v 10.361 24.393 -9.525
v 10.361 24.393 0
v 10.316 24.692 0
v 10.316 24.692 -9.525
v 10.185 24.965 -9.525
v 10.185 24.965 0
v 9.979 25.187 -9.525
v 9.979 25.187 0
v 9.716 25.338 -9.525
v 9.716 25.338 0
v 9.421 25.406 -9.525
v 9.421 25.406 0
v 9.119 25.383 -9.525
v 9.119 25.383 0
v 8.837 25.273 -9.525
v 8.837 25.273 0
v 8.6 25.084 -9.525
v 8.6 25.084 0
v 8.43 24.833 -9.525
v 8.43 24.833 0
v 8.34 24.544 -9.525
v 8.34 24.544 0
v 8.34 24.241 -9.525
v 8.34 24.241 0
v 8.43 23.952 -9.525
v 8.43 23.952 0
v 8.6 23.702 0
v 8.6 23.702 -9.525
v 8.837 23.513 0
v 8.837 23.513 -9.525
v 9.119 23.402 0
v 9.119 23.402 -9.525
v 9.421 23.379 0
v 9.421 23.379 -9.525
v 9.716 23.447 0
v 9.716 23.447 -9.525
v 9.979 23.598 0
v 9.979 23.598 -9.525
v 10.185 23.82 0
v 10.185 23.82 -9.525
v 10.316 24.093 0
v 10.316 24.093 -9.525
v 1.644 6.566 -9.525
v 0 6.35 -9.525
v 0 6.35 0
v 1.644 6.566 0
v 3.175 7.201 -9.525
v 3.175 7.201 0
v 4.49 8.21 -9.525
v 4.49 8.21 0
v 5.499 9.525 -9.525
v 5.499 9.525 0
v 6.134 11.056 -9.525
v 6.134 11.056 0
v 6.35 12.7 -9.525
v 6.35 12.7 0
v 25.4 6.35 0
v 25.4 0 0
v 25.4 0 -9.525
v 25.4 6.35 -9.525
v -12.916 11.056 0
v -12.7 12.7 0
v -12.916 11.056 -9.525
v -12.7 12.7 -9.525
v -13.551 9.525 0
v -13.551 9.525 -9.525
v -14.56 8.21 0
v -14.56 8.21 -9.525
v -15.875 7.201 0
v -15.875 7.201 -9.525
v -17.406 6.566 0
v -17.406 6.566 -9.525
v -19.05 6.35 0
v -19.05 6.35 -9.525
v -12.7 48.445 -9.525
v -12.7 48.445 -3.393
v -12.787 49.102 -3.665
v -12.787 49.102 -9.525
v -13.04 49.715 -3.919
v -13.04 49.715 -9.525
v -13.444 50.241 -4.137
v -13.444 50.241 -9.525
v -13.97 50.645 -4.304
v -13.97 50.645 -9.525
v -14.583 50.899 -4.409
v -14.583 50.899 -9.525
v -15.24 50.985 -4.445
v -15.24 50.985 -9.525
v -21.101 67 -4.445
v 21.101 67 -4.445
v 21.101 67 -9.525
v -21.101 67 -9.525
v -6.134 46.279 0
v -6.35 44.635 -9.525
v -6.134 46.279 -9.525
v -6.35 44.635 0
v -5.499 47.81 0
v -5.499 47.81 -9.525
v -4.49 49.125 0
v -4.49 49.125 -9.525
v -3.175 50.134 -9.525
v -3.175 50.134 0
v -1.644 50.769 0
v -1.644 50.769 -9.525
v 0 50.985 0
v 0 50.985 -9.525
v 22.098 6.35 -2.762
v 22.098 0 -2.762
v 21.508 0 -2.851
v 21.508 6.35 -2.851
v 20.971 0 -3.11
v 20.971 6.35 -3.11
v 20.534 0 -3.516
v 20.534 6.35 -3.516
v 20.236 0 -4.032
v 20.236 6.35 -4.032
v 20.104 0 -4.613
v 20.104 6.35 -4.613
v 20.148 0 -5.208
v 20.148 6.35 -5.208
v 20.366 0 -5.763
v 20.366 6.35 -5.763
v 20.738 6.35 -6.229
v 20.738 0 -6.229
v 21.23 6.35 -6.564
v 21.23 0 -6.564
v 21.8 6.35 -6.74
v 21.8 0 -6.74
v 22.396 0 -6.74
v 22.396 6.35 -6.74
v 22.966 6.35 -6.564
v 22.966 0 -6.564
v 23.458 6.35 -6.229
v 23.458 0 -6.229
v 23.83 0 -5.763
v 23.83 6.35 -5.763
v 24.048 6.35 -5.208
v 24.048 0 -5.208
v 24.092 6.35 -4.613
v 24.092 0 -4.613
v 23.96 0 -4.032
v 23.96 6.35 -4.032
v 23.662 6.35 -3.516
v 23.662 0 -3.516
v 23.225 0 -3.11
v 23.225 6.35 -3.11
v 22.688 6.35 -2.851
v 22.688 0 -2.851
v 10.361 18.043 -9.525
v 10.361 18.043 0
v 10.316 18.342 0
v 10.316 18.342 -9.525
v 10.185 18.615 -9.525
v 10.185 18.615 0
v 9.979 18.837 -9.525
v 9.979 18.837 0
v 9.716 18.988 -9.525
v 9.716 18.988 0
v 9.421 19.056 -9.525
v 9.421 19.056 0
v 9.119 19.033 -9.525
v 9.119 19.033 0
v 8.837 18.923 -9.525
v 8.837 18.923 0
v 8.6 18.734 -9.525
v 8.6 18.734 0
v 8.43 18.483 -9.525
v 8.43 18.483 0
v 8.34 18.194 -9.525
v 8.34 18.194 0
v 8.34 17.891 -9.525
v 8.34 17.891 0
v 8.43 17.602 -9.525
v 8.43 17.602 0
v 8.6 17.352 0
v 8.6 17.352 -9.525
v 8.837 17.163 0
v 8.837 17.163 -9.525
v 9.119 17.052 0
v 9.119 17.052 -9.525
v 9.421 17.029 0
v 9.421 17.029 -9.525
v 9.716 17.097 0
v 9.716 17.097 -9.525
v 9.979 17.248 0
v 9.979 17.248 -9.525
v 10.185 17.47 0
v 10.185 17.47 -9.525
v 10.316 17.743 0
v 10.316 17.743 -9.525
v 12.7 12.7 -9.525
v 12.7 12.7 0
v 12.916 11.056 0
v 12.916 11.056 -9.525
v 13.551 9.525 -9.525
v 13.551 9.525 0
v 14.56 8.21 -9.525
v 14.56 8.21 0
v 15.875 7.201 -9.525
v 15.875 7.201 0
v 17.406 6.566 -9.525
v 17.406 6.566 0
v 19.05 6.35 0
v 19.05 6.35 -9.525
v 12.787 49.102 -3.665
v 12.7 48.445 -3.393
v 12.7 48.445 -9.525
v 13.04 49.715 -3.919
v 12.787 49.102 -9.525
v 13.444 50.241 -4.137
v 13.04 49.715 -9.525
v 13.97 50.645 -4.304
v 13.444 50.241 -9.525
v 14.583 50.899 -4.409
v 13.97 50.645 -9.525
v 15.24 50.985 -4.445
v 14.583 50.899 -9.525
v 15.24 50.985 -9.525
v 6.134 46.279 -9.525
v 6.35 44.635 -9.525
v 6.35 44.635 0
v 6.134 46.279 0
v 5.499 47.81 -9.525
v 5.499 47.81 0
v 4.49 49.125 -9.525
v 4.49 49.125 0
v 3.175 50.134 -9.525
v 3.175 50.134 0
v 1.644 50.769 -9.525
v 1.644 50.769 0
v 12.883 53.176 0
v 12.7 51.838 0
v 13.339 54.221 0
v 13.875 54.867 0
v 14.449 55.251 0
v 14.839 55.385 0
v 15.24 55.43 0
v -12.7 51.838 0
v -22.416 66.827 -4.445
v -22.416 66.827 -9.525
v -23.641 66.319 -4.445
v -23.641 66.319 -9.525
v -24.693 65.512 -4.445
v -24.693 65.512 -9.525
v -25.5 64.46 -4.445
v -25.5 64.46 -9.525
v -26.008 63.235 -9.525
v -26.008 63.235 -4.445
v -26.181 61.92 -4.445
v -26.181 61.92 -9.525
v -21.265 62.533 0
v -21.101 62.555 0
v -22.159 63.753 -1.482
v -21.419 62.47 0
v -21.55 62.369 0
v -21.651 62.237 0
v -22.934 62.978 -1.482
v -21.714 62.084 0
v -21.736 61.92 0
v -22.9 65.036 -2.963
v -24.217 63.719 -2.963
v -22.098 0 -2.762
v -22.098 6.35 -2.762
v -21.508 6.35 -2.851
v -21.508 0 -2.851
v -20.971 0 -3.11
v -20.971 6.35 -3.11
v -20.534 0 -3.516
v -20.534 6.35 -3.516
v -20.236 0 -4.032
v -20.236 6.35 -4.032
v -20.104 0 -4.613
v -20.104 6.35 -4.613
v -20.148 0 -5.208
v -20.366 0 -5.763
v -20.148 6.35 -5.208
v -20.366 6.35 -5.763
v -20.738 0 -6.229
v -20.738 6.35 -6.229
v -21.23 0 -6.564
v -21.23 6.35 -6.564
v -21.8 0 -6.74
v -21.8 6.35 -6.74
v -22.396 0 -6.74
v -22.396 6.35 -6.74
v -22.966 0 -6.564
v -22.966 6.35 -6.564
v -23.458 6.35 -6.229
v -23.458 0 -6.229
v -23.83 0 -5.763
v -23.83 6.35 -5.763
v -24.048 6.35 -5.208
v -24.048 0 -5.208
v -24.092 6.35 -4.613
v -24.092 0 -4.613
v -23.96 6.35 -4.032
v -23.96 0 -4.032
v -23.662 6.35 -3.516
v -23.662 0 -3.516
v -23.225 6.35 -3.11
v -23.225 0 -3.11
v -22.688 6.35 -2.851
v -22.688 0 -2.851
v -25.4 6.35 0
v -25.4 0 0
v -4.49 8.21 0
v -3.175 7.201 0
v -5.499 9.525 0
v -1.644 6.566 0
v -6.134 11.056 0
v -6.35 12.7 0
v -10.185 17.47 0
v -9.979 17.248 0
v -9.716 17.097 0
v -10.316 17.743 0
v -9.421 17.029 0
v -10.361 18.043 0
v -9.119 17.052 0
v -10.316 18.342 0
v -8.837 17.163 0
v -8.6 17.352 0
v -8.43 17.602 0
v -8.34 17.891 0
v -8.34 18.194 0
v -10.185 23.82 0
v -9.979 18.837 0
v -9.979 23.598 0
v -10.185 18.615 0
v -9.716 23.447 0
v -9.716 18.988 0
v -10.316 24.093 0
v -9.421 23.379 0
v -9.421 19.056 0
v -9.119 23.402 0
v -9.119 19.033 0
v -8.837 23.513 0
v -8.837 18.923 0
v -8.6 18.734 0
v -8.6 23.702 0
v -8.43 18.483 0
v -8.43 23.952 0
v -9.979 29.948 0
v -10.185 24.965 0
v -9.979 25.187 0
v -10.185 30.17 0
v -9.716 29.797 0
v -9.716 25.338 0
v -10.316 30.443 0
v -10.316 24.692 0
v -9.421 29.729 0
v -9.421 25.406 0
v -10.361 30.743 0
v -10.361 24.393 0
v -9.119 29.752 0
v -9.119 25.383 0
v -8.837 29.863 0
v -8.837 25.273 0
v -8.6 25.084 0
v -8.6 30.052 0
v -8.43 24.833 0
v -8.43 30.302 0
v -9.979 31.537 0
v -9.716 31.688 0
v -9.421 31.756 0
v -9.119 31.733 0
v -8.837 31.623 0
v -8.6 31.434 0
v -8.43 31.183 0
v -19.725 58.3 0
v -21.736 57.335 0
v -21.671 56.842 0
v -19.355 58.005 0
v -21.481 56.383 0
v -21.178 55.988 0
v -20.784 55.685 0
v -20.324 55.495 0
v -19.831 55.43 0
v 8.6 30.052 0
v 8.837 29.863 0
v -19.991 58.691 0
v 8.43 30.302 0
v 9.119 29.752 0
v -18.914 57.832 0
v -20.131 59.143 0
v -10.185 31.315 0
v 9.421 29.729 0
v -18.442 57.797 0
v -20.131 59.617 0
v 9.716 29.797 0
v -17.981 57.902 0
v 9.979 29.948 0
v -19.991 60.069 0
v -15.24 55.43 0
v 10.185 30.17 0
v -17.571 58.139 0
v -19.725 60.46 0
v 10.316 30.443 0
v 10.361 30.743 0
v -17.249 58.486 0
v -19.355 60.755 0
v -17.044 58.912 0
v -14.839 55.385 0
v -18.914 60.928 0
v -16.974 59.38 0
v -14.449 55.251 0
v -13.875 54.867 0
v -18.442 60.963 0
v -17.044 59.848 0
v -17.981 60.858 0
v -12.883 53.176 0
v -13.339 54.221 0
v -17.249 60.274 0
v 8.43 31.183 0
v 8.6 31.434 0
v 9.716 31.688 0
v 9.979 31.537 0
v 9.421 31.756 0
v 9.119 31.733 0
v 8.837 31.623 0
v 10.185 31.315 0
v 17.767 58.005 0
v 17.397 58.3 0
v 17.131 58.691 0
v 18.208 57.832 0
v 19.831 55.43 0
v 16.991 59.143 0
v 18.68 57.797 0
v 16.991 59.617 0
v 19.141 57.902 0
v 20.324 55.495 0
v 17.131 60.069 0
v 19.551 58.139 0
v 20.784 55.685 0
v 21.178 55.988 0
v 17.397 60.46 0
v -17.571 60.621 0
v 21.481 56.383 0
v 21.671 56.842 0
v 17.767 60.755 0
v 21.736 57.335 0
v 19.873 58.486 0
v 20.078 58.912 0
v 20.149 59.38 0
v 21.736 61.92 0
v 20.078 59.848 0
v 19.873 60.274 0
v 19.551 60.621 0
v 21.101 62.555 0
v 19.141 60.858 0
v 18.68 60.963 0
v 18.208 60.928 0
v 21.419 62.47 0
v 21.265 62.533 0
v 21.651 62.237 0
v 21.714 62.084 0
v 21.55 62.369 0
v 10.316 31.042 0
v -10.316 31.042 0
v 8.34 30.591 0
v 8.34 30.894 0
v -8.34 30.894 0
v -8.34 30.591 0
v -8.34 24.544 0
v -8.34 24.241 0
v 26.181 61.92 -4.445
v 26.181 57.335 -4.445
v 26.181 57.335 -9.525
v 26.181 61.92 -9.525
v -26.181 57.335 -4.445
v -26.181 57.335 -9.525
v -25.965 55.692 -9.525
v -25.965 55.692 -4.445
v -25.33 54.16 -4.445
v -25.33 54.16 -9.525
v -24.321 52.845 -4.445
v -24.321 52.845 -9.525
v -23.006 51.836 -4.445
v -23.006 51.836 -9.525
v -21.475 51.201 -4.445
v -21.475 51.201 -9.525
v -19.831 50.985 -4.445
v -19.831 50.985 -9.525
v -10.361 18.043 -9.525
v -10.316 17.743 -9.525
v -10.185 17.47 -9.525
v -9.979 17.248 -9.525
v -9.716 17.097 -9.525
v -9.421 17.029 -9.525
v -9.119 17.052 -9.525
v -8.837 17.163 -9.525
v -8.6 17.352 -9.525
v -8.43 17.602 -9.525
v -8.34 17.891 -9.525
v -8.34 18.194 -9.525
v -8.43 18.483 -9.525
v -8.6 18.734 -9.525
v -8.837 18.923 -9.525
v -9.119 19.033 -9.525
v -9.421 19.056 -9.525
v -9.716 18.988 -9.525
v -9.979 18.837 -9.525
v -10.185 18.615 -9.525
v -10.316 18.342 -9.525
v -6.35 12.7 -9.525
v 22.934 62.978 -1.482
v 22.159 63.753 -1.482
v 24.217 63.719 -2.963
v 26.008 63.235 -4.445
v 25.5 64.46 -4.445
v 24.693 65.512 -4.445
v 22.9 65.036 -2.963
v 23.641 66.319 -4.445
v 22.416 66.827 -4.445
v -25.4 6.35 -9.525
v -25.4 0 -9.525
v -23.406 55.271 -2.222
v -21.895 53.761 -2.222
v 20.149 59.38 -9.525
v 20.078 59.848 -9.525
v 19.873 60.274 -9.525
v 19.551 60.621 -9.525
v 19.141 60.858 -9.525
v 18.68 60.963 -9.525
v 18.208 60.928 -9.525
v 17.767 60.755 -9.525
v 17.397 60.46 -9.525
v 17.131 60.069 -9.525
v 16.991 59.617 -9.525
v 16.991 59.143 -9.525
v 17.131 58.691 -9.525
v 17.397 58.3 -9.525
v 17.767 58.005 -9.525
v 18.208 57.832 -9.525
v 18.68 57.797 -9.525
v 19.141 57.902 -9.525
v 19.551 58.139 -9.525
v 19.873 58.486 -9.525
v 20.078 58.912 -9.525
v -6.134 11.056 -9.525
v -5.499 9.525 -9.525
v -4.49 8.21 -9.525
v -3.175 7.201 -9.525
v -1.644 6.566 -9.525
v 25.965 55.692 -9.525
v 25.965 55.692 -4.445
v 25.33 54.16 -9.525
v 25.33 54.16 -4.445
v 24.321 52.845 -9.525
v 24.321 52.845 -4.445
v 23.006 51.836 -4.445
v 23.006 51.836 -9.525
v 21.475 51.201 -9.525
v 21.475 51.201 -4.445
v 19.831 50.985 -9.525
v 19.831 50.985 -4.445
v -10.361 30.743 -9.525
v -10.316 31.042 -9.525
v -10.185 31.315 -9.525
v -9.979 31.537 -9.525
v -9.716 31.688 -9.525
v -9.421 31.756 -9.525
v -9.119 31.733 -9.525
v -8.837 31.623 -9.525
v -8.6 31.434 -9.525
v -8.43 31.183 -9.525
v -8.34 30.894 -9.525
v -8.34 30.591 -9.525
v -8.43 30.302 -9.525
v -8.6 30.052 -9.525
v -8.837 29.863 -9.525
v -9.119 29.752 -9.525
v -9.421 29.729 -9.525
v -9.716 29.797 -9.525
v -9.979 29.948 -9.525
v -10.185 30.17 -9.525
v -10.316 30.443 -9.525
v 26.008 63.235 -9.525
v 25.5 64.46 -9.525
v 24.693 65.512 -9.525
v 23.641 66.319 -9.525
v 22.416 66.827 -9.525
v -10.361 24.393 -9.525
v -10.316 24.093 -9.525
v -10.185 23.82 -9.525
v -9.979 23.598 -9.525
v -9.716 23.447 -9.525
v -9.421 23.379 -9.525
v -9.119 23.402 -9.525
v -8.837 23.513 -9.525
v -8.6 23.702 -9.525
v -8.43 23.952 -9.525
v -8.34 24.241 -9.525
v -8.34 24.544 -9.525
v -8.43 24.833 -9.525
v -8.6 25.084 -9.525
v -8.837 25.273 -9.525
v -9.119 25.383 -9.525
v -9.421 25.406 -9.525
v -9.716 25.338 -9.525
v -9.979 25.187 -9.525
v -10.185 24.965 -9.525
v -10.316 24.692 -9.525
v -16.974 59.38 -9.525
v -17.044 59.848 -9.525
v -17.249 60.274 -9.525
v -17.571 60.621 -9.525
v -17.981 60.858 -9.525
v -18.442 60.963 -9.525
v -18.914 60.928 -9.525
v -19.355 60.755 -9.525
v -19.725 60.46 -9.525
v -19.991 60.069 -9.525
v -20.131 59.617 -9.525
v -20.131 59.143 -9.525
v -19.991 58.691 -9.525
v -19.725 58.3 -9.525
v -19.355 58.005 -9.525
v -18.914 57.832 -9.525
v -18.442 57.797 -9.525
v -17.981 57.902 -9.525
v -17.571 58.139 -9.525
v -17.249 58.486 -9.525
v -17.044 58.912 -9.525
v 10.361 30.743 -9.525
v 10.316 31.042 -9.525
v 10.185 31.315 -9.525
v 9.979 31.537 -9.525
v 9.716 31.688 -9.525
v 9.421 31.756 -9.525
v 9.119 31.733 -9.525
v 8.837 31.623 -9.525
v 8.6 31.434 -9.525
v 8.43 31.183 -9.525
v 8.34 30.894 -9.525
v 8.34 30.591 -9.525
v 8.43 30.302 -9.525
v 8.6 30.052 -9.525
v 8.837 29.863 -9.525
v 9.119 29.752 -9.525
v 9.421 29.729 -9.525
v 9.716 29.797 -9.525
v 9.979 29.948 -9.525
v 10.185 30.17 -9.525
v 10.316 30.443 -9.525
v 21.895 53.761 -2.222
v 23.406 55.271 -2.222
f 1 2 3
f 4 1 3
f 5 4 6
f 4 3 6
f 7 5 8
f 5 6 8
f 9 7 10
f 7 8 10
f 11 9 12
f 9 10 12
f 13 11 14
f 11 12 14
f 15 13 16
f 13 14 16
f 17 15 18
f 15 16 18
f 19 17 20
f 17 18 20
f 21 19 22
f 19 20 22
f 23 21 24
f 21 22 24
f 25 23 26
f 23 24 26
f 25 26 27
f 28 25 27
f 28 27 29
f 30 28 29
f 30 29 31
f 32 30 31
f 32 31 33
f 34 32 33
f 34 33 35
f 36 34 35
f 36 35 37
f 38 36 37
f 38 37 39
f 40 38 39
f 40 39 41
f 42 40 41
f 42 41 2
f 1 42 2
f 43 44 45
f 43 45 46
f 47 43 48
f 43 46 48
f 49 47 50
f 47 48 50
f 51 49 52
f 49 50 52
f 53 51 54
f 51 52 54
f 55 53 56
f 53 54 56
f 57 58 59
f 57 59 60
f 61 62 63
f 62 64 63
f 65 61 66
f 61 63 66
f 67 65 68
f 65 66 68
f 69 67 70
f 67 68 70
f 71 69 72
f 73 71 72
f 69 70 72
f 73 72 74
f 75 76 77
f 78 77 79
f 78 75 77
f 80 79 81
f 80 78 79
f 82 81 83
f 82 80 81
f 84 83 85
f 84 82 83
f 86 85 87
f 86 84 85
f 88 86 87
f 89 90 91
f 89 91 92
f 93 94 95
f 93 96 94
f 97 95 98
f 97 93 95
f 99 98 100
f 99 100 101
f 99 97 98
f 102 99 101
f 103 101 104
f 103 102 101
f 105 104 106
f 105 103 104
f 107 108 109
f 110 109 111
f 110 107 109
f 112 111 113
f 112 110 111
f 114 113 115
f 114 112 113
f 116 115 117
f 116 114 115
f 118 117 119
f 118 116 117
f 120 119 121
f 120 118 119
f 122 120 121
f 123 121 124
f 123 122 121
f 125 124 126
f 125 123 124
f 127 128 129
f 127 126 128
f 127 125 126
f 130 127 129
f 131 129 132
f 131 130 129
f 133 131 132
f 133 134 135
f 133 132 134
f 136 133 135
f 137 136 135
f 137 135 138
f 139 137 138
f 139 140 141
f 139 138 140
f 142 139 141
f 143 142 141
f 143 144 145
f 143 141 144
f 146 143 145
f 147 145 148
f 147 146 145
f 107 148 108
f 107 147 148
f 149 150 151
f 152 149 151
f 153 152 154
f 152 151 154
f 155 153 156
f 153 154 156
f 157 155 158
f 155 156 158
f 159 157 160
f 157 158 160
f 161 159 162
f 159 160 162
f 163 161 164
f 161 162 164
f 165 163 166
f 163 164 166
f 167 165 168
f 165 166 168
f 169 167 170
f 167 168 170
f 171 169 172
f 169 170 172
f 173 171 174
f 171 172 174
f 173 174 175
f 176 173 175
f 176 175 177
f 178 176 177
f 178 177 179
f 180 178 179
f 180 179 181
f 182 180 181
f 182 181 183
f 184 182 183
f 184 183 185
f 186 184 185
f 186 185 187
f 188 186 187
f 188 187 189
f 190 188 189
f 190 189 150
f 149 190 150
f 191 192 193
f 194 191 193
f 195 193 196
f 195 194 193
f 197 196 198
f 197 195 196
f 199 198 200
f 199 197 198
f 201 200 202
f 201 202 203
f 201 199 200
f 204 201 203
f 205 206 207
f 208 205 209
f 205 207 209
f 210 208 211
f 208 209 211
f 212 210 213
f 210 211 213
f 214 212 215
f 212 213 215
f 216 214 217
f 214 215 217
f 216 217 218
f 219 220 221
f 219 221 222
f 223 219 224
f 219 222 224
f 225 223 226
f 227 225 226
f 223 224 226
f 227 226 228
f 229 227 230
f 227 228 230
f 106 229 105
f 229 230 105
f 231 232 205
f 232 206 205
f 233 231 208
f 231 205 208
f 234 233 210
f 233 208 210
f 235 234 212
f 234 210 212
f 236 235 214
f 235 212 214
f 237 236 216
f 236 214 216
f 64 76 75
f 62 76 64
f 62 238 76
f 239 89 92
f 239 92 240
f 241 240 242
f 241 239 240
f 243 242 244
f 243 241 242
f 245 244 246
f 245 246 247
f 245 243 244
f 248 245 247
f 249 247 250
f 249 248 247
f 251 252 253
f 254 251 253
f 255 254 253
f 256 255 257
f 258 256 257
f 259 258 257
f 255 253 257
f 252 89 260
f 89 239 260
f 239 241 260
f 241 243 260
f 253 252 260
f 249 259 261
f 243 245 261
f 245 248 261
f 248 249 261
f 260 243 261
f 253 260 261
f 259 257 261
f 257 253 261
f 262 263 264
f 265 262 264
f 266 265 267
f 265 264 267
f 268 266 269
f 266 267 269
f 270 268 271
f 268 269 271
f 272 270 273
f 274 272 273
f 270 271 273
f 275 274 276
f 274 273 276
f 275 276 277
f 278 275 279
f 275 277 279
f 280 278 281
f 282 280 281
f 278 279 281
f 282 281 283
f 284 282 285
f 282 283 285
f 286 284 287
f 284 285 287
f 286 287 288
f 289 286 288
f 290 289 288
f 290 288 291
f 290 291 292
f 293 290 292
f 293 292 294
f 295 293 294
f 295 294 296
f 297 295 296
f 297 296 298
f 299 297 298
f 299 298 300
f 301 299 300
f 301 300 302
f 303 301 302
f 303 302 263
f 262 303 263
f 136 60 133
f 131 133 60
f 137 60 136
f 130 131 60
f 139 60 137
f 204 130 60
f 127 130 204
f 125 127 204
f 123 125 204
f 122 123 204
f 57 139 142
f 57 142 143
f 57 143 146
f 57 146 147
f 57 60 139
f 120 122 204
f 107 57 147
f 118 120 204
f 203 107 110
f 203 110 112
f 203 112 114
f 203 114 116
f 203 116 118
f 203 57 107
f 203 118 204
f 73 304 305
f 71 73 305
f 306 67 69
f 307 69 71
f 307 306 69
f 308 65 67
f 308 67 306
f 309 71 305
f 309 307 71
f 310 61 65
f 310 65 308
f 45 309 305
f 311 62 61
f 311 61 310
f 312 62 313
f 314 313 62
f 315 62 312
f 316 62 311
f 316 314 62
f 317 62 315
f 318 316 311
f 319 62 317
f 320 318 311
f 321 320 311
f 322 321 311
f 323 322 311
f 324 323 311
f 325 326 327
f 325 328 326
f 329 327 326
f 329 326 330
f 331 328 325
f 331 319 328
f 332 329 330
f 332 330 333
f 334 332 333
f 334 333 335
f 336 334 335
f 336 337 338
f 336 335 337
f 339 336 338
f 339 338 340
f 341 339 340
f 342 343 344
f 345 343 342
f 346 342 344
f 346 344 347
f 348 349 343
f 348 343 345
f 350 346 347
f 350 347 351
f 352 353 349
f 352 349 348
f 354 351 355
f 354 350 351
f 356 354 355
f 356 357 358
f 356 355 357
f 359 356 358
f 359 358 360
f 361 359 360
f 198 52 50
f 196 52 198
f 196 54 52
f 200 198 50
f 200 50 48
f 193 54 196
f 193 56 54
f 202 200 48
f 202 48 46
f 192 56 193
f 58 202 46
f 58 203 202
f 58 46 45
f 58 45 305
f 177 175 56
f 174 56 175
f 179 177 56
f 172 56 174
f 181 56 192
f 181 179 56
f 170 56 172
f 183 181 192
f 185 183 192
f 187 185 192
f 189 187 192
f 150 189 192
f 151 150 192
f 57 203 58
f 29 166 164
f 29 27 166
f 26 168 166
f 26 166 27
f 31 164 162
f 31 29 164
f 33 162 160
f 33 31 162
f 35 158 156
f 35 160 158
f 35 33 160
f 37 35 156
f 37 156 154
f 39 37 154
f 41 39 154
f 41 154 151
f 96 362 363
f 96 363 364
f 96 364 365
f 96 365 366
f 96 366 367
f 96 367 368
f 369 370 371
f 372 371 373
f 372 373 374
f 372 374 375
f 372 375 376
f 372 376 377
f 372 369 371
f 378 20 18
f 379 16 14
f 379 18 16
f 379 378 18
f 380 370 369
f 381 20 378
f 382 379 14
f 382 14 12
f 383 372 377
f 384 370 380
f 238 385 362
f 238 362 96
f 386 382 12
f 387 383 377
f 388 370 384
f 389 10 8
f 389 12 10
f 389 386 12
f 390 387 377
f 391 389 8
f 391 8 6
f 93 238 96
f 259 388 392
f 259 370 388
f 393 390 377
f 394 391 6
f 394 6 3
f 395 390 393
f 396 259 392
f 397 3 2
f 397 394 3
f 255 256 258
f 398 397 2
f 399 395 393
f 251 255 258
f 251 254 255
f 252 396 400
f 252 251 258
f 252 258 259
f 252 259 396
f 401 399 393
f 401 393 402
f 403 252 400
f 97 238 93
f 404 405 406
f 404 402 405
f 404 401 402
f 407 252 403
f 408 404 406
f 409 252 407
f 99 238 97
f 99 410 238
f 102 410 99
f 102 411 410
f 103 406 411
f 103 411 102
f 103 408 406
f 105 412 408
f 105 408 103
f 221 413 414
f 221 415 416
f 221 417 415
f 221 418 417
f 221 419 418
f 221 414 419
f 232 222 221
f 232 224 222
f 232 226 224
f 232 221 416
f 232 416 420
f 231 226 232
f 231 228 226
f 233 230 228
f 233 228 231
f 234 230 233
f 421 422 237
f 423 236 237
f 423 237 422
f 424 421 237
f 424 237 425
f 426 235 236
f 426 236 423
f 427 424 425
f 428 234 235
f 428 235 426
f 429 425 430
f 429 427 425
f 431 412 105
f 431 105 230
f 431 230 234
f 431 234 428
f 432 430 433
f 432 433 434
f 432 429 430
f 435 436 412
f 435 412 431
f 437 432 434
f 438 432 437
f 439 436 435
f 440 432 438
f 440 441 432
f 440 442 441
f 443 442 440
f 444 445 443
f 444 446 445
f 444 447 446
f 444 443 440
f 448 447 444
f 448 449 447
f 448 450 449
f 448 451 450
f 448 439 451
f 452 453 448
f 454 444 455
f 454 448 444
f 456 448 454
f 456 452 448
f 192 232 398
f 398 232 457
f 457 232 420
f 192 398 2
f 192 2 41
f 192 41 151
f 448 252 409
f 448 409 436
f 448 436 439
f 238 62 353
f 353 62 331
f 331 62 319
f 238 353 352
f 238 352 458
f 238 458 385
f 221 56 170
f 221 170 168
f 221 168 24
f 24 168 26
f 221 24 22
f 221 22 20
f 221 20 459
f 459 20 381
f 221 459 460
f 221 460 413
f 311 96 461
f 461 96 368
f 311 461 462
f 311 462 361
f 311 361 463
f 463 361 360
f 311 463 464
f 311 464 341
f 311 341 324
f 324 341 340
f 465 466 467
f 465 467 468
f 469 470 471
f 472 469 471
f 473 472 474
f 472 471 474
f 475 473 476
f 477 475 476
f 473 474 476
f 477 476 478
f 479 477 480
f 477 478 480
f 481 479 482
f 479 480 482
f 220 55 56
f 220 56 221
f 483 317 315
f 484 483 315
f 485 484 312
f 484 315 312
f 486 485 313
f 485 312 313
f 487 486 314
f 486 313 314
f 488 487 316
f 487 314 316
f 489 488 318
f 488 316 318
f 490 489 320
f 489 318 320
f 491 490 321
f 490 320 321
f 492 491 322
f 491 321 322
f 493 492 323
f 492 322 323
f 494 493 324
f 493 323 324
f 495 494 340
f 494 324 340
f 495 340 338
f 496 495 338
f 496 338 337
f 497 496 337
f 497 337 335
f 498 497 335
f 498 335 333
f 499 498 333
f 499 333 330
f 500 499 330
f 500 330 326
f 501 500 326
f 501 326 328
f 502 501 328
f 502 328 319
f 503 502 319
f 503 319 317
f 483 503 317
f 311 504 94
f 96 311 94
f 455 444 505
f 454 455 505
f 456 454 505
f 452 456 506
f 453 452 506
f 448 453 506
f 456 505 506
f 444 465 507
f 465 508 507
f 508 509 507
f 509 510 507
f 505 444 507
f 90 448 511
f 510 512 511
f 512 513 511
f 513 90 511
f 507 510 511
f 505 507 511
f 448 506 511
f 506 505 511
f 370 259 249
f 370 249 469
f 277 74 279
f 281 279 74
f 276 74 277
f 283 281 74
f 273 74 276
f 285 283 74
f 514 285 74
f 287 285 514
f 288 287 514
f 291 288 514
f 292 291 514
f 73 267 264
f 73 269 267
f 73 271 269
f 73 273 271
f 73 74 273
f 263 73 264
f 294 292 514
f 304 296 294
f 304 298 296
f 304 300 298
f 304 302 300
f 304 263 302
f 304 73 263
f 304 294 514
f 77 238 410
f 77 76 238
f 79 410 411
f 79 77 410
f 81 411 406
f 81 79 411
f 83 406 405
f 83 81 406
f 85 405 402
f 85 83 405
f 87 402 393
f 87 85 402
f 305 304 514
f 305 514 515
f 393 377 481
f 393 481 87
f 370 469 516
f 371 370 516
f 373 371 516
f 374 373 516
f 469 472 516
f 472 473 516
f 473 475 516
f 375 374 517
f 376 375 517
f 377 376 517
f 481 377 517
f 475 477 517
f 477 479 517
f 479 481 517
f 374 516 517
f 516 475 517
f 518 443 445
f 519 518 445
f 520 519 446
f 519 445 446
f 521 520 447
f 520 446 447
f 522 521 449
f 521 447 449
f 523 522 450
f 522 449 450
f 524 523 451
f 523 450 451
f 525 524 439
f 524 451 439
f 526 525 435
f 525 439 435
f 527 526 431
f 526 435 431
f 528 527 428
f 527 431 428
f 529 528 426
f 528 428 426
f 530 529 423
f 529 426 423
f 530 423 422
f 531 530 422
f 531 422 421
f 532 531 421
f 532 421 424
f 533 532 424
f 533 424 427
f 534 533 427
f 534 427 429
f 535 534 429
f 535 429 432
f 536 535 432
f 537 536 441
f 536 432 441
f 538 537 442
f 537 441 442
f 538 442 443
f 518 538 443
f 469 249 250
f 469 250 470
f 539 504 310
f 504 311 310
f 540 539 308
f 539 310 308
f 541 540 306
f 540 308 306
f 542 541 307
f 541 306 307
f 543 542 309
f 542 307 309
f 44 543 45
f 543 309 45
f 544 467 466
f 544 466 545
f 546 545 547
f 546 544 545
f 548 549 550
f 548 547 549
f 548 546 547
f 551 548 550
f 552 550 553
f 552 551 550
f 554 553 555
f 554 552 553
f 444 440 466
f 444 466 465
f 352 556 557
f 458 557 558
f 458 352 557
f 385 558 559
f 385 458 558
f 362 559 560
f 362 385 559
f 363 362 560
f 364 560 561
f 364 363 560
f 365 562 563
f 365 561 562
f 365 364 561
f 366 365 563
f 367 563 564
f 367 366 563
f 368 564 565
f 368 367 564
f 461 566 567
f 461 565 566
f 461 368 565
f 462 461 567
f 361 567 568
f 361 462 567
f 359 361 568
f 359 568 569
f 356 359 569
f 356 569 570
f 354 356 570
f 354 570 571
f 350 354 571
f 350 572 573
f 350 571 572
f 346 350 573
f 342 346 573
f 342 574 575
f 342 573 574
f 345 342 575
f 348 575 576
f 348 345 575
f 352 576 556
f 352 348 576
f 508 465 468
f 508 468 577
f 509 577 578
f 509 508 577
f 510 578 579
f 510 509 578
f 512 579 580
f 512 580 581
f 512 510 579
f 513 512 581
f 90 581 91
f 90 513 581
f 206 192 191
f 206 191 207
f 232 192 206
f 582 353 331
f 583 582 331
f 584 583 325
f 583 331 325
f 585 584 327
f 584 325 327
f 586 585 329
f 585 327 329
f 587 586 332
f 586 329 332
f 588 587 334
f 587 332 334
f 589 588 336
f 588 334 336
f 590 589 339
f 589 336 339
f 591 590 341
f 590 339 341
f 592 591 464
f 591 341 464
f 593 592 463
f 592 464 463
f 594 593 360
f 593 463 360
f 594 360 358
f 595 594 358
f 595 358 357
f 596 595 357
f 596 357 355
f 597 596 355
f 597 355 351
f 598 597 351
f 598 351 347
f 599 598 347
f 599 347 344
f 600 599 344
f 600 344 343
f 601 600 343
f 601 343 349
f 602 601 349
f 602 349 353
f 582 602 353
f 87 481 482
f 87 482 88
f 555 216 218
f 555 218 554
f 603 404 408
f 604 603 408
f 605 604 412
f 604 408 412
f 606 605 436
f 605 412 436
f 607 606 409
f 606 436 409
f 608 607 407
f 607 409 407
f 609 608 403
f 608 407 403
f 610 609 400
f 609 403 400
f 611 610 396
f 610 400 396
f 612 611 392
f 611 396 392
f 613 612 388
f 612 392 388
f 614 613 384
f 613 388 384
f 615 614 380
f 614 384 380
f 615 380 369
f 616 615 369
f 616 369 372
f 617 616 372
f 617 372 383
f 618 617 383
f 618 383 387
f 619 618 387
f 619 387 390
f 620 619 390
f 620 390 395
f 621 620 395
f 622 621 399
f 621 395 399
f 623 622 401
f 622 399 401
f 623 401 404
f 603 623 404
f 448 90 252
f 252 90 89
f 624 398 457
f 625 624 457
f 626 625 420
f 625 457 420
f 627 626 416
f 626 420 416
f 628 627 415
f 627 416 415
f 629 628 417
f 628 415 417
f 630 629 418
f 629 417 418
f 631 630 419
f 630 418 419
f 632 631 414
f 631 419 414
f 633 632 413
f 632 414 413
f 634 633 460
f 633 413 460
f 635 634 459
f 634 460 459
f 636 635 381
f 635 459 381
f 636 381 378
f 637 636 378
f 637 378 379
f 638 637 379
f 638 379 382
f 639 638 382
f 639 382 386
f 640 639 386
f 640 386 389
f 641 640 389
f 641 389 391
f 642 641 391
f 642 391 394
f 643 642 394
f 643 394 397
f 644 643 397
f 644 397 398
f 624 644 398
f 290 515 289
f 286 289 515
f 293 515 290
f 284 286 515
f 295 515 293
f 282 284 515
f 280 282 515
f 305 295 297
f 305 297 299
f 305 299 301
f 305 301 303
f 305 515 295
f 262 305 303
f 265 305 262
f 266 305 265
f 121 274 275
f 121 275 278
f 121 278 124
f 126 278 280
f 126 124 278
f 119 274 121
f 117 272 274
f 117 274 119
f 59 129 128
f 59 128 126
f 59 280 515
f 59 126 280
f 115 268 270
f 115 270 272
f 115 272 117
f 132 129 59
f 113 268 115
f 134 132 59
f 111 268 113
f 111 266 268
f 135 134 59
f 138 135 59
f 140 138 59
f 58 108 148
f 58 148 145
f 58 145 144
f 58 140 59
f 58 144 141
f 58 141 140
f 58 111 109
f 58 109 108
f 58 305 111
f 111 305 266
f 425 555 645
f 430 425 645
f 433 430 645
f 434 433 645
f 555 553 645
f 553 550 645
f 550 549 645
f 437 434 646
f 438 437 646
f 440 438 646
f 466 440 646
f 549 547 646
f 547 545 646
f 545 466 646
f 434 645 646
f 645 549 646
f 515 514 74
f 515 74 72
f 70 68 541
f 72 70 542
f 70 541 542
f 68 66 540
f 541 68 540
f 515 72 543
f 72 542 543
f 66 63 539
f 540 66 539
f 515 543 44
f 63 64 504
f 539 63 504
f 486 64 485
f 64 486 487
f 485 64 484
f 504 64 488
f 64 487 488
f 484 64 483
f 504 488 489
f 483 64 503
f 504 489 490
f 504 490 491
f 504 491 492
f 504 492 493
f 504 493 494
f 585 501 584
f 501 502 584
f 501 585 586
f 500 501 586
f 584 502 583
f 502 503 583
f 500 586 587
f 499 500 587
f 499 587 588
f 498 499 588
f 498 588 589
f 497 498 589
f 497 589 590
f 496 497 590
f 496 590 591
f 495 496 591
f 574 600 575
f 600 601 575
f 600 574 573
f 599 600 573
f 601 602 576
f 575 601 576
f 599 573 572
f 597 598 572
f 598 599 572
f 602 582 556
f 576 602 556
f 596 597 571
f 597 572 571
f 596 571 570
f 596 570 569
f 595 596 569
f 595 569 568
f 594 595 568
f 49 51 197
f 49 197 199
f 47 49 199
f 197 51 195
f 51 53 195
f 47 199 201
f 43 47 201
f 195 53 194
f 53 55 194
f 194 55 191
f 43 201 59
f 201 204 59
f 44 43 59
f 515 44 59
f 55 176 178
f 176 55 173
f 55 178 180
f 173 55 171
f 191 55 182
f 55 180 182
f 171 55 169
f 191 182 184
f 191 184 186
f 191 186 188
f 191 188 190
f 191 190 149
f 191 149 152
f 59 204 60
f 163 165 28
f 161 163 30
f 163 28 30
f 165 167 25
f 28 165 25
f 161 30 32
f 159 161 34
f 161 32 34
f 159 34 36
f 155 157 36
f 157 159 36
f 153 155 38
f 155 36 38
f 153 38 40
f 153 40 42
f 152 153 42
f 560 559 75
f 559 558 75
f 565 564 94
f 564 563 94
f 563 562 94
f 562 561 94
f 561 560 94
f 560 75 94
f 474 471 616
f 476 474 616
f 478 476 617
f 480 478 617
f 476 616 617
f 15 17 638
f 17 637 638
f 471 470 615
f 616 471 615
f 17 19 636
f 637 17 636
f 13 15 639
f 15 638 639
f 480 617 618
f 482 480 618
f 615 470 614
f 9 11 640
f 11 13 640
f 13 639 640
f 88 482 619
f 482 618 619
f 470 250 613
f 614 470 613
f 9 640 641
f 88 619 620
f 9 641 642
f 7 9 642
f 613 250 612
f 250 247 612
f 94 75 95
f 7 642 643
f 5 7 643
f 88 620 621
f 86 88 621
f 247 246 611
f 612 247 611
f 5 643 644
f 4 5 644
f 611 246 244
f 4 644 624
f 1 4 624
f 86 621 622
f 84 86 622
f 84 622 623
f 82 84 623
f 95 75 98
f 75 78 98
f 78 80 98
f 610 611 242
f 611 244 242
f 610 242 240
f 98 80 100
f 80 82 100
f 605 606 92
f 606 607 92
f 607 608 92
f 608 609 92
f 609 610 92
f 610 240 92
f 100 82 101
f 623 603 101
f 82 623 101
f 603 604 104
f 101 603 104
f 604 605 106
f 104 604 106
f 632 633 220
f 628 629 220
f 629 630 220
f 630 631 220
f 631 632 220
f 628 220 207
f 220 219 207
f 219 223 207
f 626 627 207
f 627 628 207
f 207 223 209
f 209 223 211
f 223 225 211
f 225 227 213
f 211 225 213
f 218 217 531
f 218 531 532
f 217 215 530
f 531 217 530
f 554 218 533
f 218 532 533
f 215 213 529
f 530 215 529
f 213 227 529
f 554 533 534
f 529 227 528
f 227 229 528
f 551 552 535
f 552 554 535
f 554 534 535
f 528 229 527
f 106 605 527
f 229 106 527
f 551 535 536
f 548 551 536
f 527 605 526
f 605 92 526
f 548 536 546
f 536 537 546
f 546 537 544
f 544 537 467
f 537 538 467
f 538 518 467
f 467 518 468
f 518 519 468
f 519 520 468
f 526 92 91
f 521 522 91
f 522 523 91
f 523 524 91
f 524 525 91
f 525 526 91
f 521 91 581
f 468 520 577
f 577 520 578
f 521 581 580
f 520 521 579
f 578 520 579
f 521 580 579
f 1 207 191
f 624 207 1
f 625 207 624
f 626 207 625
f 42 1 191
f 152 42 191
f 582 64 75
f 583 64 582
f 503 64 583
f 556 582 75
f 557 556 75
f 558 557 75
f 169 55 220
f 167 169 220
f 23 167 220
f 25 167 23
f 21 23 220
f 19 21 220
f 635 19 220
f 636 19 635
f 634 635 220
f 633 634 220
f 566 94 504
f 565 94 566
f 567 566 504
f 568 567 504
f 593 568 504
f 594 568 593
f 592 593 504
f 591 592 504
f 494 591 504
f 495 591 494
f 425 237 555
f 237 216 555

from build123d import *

# Parameters (mm, degrees)
SKETCH1_R                 = 1.5875
EXTRUDE1_DEPTH            = 9.525
SKETCH2_W                 = 12.7
SKETCH2_H                 = 44.635078528
CUT_EXTRUDE1_DEPTH        = 73.561511865
FILLET1_R                 = 6.35
CHAMFER1_SIZE             = 4.445
FILLET2_R                 = 6.35
FILLET3_R                 = 6.35
SKETCH3_R                 = 2.000000064
CUT_EXTRUDE2_DEPTH        = 67.742756192
SKETCH4_R                 = 1.016
EXTRUDE2_DEPTH            = 73.561511865
LPATTERN1_COUNT           = 3
LPATTERN1_PITCH           = 6.35
LPATTERN1_COPY_1_SKETCH_R = 1.016
LPATTERN1_COPY_1_DEPTH    = 73.561511865
LPATTERN1_COPY_2_SKETCH_R = 1.016
LPATTERN1_COPY_2_DEPTH    = 73.561511865
FILLET5_R                 = 2.54


with BuildPart() as part:
    # Sketch1 → Extrude1 (new body)
    with BuildSketch(Plane.XY):
        with BuildLine():
            Line((26.18105, 50.985078528), (26.18105, 61.92))
            ThreePointArc((26.18105, 61.92), (24.693152448, 65.512102448), (21.10105, 67))
            Line((21.10105, 67), (-21.10105, 67))
            ThreePointArc((-21.10105, 67), (-24.693152448, 65.512102448), (-26.18105, 61.92))
            Line((-26.18105, 61.92), (-26.18105, 50.985078528))
            Line((-26.18105, 50.985078528), (-12.7, 50.985078528))
            Line((-12.7, 50.985078528), (-12.7, 6.35))
            Line((-12.7, 6.35), (-25.4, 6.35))
            Line((-25.4, 6.35), (-25.4, 0))
            Line((-25.4, 0), (25.4, 0))
            Line((25.4, 0), (25.4, 6.35))
            Line((25.4, 6.35), (12.7, 6.35))
            Line((12.7, 6.35), (12.7, 50.985078528))
            Line((12.7, 50.985078528), (26.18105, 50.985078528))
        make_face()
        with Locations((-18.56105, 59.38)):
            Circle(SKETCH1_R, mode=Mode.SUBTRACT)
        with Locations((18.56105, 59.38)):
            Circle(SKETCH1_R, mode=Mode.SUBTRACT)
    extrude(amount=-EXTRUDE1_DEPTH)

    # Sketch2 → Cut-Extrude1 (cut, through all)
    with BuildSketch(Plane(origin=(0, 0, -9.525), x_dir=(-1, 0, 0), z_dir=(0, 0, -1))):
        with Locations((0, 28.667539264)):
            Rectangle(SKETCH2_W, SKETCH2_H)
    extrude(amount=-CUT_EXTRUDE1_DEPTH, mode=Mode.SUBTRACT)

    # Fillet1
    fillet1_edges = [part.edges().sort_by_distance(p)[0] for p in [
        (-26.18105, 50.985078528, -4.7625),
        (26.18105, 50.985078528, -4.7625),
    ]]
    fillet(fillet1_edges, radius=FILLET1_R)

    # Chamfer1
    chamfer1_edges = [part.edges().sort_by_distance(p)[0] for p in [
        (-16.265525, 50.985078528, 0),
        (-26.18105, 59.627539264, 0),
        (16.265525, 50.985078528, 0),
        (0, 67, 0),
        (26.18105, 59.627539264, 0),
    ]]
    chamfer(chamfer1_edges, length=CHAMFER1_SIZE)

    # Fillet2
    fillet2_edges = [part.edges().sort_by_distance(p)[0] for p in [
        (6.35, 50.985078528, -4.7625),
        (-6.35, 50.985078528, -4.7625),
        (6.35, 6.35, -4.7625),
        (-6.35, 6.35, -4.7625),
    ]]
    fillet(fillet2_edges, radius=FILLET2_R - 0.0001)  # a hair under: the kernel refuses the full size

    # Fillet3
    fillet3_edges = [part.edges().sort_by_distance(p)[0] for p in [
        (-12.7, 6.35, -4.7625),
        (12.7, 6.35, -4.7625),
    ]]
    fillet(fillet3_edges, radius=FILLET3_R)

    # Sketch3 → Cut-Extrude2 (cut, through all)
    with BuildSketch(Plane(origin=(0, 6.35, 0), x_dir=(1, 0, 0), z_dir=(0, 1, 0))):
        with Locations(Location((-22.098, 4.7625, 0), (0, 0, 270))):
            Circle(SKETCH3_R)
    cut_extrude2 = extrude(amount=-CUT_EXTRUDE2_DEPTH, mode=Mode.SUBTRACT)

    # Mirror2: Cut-Extrude2 across plane
    add(cut_extrude2.mirror(Plane(origin=(0, 0, 0), x_dir=(0, 0, 1), z_dir=(1, 0, 0))), mode=Mode.SUBTRACT)

    # Sketch4 → Extrude2 (cut, through all)
    with BuildSketch(Plane.XY):
        with Locations((9.345089473, 30.742631811)):
            Circle(SKETCH4_R)
    extrude2 = extrude(amount=-EXTRUDE2_DEPTH, mode=Mode.SUBTRACT)

    # Mirror3: Extrude2 across plane
    add(extrude2.mirror(Plane(origin=(0, 0, 0), x_dir=(0, 0, 1), z_dir=(1, 0, 0))), mode=Mode.SUBTRACT)

    # LPattern1: Extrude2 ×3
    with Locations(*[(0, -i * LPATTERN1_PITCH, 0) for i in range(1, LPATTERN1_COUNT)]):
        add(extrude2, mode=Mode.SUBTRACT)

    # LPattern1 copy 1 sketch → LPattern1 copy 1 (cut, through all)
    with BuildSketch(Plane(origin=(0, -6.35, 0), x_dir=(-1, 0, 0), z_dir=(0, 0, 1))):
        with Locations((9.345089473, -30.742631811)):
            Circle(LPATTERN1_COPY_1_SKETCH_R)
    extrude(amount=-LPATTERN1_COPY_1_DEPTH, mode=Mode.SUBTRACT)

    # LPattern1 copy 2 sketch → LPattern1 copy 2 (cut, through all)
    with BuildSketch(Plane(origin=(0, -12.7, 0), x_dir=(-1, 0, 0), z_dir=(0, 0, 1))):
        with Locations((9.345089473, -30.742631811)):
            Circle(LPATTERN1_COPY_2_SKETCH_R)
    extrude(amount=-LPATTERN1_COPY_2_DEPTH, mode=Mode.SUBTRACT)

    # Fillet5
    fillet5_edges = [part.edges().sort_by_distance(p)[0] for p in [
        (-12.7, 50.985078528, -6.985),
        (12.7, 50.985078528, -6.985),
        (-12.7, 53.207578528, -2.2225),
        (12.7, 53.207578528, -2.2225),
    ]]
    fillet(fillet5_edges, radius=FILLET5_R)


solid = part.part
